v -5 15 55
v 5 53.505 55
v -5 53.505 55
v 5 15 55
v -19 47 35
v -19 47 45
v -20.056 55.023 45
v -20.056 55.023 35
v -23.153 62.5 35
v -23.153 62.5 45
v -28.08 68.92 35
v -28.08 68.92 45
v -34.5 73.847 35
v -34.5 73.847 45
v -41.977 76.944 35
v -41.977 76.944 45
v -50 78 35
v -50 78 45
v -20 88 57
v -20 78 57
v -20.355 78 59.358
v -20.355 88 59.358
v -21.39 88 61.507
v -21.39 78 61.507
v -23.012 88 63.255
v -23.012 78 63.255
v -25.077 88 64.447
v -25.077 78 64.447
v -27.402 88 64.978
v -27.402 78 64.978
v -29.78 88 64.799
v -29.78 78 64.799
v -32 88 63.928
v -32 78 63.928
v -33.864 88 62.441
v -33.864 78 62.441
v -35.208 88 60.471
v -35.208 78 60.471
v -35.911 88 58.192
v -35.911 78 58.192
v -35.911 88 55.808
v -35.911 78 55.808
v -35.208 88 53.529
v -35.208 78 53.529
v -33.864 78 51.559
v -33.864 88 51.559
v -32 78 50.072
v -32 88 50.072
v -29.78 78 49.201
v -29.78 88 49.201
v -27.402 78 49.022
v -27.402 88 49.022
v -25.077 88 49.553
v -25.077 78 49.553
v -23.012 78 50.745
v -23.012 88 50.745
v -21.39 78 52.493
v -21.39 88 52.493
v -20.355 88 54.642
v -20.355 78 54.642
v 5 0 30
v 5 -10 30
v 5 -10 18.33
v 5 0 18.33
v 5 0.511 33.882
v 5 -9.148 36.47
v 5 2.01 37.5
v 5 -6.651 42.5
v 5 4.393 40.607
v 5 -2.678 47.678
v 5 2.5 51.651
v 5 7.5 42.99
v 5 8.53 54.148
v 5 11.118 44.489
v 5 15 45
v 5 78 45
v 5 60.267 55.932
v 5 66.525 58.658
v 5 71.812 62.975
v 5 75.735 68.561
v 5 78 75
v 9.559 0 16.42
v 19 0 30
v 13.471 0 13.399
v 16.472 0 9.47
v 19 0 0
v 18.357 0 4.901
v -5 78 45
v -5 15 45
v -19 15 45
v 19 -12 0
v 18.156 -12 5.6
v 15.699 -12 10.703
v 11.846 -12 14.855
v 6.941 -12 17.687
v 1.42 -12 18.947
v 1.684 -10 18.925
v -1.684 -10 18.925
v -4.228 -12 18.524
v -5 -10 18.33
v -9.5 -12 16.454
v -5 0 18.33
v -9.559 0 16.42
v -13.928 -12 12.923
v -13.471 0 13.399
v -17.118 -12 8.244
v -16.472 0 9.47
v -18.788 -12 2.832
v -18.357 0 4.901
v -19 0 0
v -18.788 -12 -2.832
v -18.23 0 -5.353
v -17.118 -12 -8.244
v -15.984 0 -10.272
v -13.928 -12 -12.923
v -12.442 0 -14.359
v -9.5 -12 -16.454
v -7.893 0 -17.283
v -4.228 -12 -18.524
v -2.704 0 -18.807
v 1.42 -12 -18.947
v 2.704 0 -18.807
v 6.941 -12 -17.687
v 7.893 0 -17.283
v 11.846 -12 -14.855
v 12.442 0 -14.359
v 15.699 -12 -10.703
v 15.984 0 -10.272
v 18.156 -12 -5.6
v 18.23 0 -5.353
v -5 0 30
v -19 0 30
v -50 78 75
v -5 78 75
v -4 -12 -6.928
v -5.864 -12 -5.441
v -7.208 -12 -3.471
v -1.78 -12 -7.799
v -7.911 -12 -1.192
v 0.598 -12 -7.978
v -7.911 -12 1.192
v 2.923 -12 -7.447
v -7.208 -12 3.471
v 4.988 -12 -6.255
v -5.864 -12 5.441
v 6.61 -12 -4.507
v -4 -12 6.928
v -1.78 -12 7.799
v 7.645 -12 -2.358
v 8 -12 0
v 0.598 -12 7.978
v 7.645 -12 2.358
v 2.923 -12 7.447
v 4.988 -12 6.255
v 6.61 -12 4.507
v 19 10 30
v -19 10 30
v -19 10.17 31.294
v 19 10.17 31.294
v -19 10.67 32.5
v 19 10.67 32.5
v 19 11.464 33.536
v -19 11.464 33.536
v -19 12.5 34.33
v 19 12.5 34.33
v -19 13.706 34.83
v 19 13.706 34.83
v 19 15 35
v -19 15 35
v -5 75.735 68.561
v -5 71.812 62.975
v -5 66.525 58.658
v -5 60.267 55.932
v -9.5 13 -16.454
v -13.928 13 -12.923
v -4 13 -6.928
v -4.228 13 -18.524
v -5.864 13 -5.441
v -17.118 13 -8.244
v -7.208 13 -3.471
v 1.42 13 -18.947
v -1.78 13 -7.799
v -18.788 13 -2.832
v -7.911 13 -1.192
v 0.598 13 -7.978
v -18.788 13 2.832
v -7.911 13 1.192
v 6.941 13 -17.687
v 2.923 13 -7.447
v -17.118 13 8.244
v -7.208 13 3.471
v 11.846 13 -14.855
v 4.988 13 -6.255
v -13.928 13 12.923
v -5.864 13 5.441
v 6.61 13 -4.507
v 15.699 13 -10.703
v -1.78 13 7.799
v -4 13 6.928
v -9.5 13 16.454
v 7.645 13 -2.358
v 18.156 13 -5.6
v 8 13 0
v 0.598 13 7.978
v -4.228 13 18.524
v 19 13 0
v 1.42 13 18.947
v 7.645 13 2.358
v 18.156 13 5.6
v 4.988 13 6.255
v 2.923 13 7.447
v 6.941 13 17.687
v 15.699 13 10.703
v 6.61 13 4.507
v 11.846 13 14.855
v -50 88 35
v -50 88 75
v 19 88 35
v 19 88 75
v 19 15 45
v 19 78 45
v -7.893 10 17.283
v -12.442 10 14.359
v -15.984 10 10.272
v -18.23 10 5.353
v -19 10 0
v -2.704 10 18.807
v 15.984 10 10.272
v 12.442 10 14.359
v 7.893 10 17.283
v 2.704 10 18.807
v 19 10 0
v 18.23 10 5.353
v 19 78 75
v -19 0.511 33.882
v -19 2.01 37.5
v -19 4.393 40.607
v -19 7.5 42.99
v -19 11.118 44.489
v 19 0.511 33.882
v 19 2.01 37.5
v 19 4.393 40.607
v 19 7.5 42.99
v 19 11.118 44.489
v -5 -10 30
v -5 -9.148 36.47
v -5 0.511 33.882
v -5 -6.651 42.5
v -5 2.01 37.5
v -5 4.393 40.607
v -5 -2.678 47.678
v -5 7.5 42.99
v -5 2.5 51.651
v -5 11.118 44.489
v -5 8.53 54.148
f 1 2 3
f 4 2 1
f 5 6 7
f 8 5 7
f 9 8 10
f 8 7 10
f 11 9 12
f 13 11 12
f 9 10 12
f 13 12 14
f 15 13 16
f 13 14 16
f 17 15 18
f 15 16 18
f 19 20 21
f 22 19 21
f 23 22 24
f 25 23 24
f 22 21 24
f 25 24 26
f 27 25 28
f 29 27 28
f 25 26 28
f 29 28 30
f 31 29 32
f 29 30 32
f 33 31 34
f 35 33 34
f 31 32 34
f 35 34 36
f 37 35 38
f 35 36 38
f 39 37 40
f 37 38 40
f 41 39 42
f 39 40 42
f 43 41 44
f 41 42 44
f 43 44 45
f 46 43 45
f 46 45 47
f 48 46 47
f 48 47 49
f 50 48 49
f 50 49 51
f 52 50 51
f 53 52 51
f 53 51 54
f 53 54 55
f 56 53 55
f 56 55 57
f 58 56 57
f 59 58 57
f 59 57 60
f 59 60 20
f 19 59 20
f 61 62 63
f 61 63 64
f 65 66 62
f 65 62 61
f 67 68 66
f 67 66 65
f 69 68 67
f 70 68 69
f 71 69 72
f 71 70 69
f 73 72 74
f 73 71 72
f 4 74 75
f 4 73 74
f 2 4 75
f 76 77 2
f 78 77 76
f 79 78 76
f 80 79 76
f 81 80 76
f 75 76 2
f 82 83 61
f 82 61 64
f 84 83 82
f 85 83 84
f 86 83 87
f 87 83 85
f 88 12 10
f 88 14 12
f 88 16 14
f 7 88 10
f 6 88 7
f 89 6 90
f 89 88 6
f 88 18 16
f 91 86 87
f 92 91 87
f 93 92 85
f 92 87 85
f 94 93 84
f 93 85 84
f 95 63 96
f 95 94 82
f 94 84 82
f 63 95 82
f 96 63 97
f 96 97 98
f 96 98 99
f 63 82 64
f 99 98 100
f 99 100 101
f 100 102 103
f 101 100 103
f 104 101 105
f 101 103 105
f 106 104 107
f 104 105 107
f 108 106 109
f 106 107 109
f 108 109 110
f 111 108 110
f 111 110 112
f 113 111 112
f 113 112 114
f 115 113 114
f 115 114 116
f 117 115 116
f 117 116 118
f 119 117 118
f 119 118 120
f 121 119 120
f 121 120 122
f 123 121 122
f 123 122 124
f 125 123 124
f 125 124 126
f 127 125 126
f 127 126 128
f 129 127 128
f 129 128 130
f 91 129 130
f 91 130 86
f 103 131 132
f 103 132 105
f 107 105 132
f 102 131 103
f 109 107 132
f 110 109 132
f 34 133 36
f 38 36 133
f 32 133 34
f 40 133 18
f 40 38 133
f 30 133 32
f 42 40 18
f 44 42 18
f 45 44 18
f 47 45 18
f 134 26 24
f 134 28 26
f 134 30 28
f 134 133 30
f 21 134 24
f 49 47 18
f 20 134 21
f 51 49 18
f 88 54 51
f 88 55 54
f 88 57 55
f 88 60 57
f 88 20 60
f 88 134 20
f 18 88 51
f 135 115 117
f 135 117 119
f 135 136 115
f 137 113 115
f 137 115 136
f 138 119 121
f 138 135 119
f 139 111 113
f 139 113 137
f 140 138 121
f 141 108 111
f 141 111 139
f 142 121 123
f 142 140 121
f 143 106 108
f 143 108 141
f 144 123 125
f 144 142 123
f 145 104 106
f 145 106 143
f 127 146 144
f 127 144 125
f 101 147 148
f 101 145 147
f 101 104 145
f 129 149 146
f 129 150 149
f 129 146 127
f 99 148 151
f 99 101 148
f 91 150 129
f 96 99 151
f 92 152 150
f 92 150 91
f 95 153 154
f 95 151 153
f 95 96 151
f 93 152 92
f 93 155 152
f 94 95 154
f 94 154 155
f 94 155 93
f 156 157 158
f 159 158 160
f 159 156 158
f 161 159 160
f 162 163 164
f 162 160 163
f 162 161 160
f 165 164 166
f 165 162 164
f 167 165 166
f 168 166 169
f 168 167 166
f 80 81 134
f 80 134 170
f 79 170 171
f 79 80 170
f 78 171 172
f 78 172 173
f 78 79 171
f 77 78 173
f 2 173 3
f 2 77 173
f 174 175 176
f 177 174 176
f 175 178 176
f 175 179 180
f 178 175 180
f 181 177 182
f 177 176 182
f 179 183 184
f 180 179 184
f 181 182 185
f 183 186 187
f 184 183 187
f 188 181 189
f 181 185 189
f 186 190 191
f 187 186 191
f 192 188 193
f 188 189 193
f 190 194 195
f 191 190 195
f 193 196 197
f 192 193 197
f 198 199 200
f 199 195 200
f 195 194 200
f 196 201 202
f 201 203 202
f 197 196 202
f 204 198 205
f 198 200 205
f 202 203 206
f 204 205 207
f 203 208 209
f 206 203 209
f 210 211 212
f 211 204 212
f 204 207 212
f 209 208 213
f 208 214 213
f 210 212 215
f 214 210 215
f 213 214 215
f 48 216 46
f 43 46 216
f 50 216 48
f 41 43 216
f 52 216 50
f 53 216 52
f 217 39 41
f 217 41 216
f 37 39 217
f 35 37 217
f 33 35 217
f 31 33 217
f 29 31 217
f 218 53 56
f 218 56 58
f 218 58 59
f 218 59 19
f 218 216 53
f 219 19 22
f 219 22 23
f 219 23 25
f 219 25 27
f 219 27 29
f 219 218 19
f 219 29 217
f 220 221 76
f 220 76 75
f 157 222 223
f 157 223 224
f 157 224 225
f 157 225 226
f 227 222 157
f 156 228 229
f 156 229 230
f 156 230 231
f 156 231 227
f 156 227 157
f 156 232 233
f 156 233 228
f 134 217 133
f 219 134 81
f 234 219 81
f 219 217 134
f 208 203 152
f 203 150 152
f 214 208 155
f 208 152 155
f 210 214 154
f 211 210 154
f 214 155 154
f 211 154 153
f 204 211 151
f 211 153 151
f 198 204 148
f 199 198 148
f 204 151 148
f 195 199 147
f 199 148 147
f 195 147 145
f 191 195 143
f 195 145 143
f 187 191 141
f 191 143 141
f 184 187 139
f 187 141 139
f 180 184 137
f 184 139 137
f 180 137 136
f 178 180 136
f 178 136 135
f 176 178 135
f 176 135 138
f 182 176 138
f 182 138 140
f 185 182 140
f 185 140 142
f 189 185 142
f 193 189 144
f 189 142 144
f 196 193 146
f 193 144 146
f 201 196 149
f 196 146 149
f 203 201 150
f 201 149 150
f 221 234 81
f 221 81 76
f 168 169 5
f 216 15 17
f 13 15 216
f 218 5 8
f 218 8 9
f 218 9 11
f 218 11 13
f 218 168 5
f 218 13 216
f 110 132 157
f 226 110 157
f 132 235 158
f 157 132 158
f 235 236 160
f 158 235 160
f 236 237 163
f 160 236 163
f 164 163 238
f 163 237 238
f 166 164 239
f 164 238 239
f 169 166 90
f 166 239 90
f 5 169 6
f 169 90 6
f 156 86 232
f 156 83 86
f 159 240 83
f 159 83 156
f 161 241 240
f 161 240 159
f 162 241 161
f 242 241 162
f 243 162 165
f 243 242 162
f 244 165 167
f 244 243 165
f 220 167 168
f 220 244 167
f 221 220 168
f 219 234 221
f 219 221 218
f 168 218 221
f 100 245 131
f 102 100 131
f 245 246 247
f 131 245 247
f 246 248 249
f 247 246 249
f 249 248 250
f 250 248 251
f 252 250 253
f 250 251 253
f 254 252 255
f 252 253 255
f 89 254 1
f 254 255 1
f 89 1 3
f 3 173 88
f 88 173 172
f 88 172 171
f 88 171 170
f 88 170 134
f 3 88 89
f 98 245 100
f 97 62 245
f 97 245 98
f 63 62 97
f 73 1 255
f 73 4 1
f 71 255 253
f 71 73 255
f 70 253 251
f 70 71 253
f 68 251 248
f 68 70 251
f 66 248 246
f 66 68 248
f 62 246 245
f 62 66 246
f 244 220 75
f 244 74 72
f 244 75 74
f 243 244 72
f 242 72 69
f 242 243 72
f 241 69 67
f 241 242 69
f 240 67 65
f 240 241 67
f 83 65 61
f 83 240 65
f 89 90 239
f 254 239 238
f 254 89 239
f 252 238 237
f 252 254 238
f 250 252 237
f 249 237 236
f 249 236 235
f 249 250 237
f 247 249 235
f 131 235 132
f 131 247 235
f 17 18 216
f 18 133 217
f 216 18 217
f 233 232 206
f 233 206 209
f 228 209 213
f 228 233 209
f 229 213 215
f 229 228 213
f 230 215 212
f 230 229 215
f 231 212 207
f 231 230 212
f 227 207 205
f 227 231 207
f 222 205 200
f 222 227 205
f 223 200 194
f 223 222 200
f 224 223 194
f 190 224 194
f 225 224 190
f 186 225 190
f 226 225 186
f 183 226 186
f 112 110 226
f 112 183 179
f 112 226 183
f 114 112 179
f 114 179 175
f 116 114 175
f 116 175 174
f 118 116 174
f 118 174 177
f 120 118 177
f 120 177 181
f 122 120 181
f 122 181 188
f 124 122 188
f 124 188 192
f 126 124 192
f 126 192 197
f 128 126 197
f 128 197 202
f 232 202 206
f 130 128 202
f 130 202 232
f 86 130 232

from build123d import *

# Parameters (mm, degrees)
F1_DEPTH  = 19
F2_DEPTH  = 5
F3_DEPTH  = 50
F5_DEPTH  = 45.001
F6_R      = 19
F6_R_2    = 8
F7_DEPTH  = 12
F8_DEPTH  = 13
F9_DEPTH  = 50
F10_R     = 8
F11_DEPTH = 10.001


with BuildPart() as f1:
    # F0 (on Right) → F1 (new body, symmetric)
    with BuildSketch(Plane.YZ):
        with BuildLine():
            Line((0, 0), (10, 0))
            Line((10, 0), (10, 30))
            ThreePointArc((10, 30), (11.464466, 33.535534), (15, 35))
            Line((15, 35), (88, 35))
            Line((88, 35), (88, 75))
            Line((88, 75), (78, 75))
            Line((78, 75), (78, 45))
            Line((78, 45), (15, 45))
            ThreePointArc((15, 45), (4.393398, 40.606602), (0, 30))
            Line((0, 30), (0, 0))
        make_face()
    extrude(amount=F1_DEPTH, both=True)

    # F0 (on Right) → F2 (join, symmetric)
    with BuildSketch(Plane.YZ):
        with BuildLine():
            Line((-10, 0), (0, 0))
            Line((0, 0), (0, 30))
            ThreePointArc((0, 30), (4.393398, 40.606602), (15, 45))
            Line((15, 45), (78, 45))
            Line((78, 45), (78, 75))
            ThreePointArc((78, 75), (69.316491, 60.635083), (53.505103, 55))
            Line((53.505103, 55), (15, 55))
            ThreePointArc((15, 55), (-2.67767, 47.67767), (-10, 30))
            Line((-10, 30), (-10, 0))
        make_face()
    extrude(amount=F2_DEPTH, both=True)

    # F0 (on Right) → F3 (join)
    with BuildSketch(Plane.YZ):
        with BuildLine():
            Line((0, 0), (10, 0))
            Line((10, 0), (10, 30))
            ThreePointArc((10, 30), (11.464466, 33.535534), (15, 35))
            Line((15, 35), (88, 35))
            Line((88, 35), (88, 75))
            Line((88, 75), (78, 75))
            Line((78, 75), (78, 45))
            Line((78, 45), (15, 45))
            ThreePointArc((15, 45), (4.393398, 40.606602), (0, 30))
            Line((0, 30), (0, 0))
        make_face()
    extrude(amount=-F3_DEPTH)

    # F4 (on face) → F5 (cut, through all)
    with BuildSketch(Plane.XY.offset(45)):
        with BuildLine():
            ThreePointArc((-19, 47), (-28.07969, 68.92031), (-50, 78))
            Line((-50, 78), (-50, 0))
            Line((-50, 0), (-19, 0))
            Line((-19, 0), (-19, 15))
            Line((-19, 15), (-19, 47))
        make_face()
    extrude(amount=-F5_DEPTH, mode=Mode.SUBTRACT)

    # F6 (on Front) → F7 (join)
    with BuildSketch(Plane.XZ):
        Circle(F6_R)
        Circle(F6_R_2, mode=Mode.SUBTRACT)
        Circle(F6_R_2)
    extrude(amount=F7_DEPTH)

    # F6 (on Front) → F8 (join)
    with BuildSketch(Plane.XZ):
        Circle(F6_R)
        Circle(F6_R_2, mode=Mode.SUBTRACT)
        Circle(F6_R_2)
    extrude(amount=-F8_DEPTH)

    # F6 (on Front) → F9 (cut, symmetric)
    with BuildSketch(Plane.XZ):
        Circle(F6_R_2)
    extrude(amount=F9_DEPTH, both=True, mode=Mode.SUBTRACT)

    # F10 (on face) → F11 (cut, through all)
    with BuildSketch(Plane.XZ.offset(-78)):
        with Locations((-28, 57)):
            Circle(F10_R)
    extrude(amount=-F11_DEPTH, mode=Mode.SUBTRACT)


solid = f1.part
